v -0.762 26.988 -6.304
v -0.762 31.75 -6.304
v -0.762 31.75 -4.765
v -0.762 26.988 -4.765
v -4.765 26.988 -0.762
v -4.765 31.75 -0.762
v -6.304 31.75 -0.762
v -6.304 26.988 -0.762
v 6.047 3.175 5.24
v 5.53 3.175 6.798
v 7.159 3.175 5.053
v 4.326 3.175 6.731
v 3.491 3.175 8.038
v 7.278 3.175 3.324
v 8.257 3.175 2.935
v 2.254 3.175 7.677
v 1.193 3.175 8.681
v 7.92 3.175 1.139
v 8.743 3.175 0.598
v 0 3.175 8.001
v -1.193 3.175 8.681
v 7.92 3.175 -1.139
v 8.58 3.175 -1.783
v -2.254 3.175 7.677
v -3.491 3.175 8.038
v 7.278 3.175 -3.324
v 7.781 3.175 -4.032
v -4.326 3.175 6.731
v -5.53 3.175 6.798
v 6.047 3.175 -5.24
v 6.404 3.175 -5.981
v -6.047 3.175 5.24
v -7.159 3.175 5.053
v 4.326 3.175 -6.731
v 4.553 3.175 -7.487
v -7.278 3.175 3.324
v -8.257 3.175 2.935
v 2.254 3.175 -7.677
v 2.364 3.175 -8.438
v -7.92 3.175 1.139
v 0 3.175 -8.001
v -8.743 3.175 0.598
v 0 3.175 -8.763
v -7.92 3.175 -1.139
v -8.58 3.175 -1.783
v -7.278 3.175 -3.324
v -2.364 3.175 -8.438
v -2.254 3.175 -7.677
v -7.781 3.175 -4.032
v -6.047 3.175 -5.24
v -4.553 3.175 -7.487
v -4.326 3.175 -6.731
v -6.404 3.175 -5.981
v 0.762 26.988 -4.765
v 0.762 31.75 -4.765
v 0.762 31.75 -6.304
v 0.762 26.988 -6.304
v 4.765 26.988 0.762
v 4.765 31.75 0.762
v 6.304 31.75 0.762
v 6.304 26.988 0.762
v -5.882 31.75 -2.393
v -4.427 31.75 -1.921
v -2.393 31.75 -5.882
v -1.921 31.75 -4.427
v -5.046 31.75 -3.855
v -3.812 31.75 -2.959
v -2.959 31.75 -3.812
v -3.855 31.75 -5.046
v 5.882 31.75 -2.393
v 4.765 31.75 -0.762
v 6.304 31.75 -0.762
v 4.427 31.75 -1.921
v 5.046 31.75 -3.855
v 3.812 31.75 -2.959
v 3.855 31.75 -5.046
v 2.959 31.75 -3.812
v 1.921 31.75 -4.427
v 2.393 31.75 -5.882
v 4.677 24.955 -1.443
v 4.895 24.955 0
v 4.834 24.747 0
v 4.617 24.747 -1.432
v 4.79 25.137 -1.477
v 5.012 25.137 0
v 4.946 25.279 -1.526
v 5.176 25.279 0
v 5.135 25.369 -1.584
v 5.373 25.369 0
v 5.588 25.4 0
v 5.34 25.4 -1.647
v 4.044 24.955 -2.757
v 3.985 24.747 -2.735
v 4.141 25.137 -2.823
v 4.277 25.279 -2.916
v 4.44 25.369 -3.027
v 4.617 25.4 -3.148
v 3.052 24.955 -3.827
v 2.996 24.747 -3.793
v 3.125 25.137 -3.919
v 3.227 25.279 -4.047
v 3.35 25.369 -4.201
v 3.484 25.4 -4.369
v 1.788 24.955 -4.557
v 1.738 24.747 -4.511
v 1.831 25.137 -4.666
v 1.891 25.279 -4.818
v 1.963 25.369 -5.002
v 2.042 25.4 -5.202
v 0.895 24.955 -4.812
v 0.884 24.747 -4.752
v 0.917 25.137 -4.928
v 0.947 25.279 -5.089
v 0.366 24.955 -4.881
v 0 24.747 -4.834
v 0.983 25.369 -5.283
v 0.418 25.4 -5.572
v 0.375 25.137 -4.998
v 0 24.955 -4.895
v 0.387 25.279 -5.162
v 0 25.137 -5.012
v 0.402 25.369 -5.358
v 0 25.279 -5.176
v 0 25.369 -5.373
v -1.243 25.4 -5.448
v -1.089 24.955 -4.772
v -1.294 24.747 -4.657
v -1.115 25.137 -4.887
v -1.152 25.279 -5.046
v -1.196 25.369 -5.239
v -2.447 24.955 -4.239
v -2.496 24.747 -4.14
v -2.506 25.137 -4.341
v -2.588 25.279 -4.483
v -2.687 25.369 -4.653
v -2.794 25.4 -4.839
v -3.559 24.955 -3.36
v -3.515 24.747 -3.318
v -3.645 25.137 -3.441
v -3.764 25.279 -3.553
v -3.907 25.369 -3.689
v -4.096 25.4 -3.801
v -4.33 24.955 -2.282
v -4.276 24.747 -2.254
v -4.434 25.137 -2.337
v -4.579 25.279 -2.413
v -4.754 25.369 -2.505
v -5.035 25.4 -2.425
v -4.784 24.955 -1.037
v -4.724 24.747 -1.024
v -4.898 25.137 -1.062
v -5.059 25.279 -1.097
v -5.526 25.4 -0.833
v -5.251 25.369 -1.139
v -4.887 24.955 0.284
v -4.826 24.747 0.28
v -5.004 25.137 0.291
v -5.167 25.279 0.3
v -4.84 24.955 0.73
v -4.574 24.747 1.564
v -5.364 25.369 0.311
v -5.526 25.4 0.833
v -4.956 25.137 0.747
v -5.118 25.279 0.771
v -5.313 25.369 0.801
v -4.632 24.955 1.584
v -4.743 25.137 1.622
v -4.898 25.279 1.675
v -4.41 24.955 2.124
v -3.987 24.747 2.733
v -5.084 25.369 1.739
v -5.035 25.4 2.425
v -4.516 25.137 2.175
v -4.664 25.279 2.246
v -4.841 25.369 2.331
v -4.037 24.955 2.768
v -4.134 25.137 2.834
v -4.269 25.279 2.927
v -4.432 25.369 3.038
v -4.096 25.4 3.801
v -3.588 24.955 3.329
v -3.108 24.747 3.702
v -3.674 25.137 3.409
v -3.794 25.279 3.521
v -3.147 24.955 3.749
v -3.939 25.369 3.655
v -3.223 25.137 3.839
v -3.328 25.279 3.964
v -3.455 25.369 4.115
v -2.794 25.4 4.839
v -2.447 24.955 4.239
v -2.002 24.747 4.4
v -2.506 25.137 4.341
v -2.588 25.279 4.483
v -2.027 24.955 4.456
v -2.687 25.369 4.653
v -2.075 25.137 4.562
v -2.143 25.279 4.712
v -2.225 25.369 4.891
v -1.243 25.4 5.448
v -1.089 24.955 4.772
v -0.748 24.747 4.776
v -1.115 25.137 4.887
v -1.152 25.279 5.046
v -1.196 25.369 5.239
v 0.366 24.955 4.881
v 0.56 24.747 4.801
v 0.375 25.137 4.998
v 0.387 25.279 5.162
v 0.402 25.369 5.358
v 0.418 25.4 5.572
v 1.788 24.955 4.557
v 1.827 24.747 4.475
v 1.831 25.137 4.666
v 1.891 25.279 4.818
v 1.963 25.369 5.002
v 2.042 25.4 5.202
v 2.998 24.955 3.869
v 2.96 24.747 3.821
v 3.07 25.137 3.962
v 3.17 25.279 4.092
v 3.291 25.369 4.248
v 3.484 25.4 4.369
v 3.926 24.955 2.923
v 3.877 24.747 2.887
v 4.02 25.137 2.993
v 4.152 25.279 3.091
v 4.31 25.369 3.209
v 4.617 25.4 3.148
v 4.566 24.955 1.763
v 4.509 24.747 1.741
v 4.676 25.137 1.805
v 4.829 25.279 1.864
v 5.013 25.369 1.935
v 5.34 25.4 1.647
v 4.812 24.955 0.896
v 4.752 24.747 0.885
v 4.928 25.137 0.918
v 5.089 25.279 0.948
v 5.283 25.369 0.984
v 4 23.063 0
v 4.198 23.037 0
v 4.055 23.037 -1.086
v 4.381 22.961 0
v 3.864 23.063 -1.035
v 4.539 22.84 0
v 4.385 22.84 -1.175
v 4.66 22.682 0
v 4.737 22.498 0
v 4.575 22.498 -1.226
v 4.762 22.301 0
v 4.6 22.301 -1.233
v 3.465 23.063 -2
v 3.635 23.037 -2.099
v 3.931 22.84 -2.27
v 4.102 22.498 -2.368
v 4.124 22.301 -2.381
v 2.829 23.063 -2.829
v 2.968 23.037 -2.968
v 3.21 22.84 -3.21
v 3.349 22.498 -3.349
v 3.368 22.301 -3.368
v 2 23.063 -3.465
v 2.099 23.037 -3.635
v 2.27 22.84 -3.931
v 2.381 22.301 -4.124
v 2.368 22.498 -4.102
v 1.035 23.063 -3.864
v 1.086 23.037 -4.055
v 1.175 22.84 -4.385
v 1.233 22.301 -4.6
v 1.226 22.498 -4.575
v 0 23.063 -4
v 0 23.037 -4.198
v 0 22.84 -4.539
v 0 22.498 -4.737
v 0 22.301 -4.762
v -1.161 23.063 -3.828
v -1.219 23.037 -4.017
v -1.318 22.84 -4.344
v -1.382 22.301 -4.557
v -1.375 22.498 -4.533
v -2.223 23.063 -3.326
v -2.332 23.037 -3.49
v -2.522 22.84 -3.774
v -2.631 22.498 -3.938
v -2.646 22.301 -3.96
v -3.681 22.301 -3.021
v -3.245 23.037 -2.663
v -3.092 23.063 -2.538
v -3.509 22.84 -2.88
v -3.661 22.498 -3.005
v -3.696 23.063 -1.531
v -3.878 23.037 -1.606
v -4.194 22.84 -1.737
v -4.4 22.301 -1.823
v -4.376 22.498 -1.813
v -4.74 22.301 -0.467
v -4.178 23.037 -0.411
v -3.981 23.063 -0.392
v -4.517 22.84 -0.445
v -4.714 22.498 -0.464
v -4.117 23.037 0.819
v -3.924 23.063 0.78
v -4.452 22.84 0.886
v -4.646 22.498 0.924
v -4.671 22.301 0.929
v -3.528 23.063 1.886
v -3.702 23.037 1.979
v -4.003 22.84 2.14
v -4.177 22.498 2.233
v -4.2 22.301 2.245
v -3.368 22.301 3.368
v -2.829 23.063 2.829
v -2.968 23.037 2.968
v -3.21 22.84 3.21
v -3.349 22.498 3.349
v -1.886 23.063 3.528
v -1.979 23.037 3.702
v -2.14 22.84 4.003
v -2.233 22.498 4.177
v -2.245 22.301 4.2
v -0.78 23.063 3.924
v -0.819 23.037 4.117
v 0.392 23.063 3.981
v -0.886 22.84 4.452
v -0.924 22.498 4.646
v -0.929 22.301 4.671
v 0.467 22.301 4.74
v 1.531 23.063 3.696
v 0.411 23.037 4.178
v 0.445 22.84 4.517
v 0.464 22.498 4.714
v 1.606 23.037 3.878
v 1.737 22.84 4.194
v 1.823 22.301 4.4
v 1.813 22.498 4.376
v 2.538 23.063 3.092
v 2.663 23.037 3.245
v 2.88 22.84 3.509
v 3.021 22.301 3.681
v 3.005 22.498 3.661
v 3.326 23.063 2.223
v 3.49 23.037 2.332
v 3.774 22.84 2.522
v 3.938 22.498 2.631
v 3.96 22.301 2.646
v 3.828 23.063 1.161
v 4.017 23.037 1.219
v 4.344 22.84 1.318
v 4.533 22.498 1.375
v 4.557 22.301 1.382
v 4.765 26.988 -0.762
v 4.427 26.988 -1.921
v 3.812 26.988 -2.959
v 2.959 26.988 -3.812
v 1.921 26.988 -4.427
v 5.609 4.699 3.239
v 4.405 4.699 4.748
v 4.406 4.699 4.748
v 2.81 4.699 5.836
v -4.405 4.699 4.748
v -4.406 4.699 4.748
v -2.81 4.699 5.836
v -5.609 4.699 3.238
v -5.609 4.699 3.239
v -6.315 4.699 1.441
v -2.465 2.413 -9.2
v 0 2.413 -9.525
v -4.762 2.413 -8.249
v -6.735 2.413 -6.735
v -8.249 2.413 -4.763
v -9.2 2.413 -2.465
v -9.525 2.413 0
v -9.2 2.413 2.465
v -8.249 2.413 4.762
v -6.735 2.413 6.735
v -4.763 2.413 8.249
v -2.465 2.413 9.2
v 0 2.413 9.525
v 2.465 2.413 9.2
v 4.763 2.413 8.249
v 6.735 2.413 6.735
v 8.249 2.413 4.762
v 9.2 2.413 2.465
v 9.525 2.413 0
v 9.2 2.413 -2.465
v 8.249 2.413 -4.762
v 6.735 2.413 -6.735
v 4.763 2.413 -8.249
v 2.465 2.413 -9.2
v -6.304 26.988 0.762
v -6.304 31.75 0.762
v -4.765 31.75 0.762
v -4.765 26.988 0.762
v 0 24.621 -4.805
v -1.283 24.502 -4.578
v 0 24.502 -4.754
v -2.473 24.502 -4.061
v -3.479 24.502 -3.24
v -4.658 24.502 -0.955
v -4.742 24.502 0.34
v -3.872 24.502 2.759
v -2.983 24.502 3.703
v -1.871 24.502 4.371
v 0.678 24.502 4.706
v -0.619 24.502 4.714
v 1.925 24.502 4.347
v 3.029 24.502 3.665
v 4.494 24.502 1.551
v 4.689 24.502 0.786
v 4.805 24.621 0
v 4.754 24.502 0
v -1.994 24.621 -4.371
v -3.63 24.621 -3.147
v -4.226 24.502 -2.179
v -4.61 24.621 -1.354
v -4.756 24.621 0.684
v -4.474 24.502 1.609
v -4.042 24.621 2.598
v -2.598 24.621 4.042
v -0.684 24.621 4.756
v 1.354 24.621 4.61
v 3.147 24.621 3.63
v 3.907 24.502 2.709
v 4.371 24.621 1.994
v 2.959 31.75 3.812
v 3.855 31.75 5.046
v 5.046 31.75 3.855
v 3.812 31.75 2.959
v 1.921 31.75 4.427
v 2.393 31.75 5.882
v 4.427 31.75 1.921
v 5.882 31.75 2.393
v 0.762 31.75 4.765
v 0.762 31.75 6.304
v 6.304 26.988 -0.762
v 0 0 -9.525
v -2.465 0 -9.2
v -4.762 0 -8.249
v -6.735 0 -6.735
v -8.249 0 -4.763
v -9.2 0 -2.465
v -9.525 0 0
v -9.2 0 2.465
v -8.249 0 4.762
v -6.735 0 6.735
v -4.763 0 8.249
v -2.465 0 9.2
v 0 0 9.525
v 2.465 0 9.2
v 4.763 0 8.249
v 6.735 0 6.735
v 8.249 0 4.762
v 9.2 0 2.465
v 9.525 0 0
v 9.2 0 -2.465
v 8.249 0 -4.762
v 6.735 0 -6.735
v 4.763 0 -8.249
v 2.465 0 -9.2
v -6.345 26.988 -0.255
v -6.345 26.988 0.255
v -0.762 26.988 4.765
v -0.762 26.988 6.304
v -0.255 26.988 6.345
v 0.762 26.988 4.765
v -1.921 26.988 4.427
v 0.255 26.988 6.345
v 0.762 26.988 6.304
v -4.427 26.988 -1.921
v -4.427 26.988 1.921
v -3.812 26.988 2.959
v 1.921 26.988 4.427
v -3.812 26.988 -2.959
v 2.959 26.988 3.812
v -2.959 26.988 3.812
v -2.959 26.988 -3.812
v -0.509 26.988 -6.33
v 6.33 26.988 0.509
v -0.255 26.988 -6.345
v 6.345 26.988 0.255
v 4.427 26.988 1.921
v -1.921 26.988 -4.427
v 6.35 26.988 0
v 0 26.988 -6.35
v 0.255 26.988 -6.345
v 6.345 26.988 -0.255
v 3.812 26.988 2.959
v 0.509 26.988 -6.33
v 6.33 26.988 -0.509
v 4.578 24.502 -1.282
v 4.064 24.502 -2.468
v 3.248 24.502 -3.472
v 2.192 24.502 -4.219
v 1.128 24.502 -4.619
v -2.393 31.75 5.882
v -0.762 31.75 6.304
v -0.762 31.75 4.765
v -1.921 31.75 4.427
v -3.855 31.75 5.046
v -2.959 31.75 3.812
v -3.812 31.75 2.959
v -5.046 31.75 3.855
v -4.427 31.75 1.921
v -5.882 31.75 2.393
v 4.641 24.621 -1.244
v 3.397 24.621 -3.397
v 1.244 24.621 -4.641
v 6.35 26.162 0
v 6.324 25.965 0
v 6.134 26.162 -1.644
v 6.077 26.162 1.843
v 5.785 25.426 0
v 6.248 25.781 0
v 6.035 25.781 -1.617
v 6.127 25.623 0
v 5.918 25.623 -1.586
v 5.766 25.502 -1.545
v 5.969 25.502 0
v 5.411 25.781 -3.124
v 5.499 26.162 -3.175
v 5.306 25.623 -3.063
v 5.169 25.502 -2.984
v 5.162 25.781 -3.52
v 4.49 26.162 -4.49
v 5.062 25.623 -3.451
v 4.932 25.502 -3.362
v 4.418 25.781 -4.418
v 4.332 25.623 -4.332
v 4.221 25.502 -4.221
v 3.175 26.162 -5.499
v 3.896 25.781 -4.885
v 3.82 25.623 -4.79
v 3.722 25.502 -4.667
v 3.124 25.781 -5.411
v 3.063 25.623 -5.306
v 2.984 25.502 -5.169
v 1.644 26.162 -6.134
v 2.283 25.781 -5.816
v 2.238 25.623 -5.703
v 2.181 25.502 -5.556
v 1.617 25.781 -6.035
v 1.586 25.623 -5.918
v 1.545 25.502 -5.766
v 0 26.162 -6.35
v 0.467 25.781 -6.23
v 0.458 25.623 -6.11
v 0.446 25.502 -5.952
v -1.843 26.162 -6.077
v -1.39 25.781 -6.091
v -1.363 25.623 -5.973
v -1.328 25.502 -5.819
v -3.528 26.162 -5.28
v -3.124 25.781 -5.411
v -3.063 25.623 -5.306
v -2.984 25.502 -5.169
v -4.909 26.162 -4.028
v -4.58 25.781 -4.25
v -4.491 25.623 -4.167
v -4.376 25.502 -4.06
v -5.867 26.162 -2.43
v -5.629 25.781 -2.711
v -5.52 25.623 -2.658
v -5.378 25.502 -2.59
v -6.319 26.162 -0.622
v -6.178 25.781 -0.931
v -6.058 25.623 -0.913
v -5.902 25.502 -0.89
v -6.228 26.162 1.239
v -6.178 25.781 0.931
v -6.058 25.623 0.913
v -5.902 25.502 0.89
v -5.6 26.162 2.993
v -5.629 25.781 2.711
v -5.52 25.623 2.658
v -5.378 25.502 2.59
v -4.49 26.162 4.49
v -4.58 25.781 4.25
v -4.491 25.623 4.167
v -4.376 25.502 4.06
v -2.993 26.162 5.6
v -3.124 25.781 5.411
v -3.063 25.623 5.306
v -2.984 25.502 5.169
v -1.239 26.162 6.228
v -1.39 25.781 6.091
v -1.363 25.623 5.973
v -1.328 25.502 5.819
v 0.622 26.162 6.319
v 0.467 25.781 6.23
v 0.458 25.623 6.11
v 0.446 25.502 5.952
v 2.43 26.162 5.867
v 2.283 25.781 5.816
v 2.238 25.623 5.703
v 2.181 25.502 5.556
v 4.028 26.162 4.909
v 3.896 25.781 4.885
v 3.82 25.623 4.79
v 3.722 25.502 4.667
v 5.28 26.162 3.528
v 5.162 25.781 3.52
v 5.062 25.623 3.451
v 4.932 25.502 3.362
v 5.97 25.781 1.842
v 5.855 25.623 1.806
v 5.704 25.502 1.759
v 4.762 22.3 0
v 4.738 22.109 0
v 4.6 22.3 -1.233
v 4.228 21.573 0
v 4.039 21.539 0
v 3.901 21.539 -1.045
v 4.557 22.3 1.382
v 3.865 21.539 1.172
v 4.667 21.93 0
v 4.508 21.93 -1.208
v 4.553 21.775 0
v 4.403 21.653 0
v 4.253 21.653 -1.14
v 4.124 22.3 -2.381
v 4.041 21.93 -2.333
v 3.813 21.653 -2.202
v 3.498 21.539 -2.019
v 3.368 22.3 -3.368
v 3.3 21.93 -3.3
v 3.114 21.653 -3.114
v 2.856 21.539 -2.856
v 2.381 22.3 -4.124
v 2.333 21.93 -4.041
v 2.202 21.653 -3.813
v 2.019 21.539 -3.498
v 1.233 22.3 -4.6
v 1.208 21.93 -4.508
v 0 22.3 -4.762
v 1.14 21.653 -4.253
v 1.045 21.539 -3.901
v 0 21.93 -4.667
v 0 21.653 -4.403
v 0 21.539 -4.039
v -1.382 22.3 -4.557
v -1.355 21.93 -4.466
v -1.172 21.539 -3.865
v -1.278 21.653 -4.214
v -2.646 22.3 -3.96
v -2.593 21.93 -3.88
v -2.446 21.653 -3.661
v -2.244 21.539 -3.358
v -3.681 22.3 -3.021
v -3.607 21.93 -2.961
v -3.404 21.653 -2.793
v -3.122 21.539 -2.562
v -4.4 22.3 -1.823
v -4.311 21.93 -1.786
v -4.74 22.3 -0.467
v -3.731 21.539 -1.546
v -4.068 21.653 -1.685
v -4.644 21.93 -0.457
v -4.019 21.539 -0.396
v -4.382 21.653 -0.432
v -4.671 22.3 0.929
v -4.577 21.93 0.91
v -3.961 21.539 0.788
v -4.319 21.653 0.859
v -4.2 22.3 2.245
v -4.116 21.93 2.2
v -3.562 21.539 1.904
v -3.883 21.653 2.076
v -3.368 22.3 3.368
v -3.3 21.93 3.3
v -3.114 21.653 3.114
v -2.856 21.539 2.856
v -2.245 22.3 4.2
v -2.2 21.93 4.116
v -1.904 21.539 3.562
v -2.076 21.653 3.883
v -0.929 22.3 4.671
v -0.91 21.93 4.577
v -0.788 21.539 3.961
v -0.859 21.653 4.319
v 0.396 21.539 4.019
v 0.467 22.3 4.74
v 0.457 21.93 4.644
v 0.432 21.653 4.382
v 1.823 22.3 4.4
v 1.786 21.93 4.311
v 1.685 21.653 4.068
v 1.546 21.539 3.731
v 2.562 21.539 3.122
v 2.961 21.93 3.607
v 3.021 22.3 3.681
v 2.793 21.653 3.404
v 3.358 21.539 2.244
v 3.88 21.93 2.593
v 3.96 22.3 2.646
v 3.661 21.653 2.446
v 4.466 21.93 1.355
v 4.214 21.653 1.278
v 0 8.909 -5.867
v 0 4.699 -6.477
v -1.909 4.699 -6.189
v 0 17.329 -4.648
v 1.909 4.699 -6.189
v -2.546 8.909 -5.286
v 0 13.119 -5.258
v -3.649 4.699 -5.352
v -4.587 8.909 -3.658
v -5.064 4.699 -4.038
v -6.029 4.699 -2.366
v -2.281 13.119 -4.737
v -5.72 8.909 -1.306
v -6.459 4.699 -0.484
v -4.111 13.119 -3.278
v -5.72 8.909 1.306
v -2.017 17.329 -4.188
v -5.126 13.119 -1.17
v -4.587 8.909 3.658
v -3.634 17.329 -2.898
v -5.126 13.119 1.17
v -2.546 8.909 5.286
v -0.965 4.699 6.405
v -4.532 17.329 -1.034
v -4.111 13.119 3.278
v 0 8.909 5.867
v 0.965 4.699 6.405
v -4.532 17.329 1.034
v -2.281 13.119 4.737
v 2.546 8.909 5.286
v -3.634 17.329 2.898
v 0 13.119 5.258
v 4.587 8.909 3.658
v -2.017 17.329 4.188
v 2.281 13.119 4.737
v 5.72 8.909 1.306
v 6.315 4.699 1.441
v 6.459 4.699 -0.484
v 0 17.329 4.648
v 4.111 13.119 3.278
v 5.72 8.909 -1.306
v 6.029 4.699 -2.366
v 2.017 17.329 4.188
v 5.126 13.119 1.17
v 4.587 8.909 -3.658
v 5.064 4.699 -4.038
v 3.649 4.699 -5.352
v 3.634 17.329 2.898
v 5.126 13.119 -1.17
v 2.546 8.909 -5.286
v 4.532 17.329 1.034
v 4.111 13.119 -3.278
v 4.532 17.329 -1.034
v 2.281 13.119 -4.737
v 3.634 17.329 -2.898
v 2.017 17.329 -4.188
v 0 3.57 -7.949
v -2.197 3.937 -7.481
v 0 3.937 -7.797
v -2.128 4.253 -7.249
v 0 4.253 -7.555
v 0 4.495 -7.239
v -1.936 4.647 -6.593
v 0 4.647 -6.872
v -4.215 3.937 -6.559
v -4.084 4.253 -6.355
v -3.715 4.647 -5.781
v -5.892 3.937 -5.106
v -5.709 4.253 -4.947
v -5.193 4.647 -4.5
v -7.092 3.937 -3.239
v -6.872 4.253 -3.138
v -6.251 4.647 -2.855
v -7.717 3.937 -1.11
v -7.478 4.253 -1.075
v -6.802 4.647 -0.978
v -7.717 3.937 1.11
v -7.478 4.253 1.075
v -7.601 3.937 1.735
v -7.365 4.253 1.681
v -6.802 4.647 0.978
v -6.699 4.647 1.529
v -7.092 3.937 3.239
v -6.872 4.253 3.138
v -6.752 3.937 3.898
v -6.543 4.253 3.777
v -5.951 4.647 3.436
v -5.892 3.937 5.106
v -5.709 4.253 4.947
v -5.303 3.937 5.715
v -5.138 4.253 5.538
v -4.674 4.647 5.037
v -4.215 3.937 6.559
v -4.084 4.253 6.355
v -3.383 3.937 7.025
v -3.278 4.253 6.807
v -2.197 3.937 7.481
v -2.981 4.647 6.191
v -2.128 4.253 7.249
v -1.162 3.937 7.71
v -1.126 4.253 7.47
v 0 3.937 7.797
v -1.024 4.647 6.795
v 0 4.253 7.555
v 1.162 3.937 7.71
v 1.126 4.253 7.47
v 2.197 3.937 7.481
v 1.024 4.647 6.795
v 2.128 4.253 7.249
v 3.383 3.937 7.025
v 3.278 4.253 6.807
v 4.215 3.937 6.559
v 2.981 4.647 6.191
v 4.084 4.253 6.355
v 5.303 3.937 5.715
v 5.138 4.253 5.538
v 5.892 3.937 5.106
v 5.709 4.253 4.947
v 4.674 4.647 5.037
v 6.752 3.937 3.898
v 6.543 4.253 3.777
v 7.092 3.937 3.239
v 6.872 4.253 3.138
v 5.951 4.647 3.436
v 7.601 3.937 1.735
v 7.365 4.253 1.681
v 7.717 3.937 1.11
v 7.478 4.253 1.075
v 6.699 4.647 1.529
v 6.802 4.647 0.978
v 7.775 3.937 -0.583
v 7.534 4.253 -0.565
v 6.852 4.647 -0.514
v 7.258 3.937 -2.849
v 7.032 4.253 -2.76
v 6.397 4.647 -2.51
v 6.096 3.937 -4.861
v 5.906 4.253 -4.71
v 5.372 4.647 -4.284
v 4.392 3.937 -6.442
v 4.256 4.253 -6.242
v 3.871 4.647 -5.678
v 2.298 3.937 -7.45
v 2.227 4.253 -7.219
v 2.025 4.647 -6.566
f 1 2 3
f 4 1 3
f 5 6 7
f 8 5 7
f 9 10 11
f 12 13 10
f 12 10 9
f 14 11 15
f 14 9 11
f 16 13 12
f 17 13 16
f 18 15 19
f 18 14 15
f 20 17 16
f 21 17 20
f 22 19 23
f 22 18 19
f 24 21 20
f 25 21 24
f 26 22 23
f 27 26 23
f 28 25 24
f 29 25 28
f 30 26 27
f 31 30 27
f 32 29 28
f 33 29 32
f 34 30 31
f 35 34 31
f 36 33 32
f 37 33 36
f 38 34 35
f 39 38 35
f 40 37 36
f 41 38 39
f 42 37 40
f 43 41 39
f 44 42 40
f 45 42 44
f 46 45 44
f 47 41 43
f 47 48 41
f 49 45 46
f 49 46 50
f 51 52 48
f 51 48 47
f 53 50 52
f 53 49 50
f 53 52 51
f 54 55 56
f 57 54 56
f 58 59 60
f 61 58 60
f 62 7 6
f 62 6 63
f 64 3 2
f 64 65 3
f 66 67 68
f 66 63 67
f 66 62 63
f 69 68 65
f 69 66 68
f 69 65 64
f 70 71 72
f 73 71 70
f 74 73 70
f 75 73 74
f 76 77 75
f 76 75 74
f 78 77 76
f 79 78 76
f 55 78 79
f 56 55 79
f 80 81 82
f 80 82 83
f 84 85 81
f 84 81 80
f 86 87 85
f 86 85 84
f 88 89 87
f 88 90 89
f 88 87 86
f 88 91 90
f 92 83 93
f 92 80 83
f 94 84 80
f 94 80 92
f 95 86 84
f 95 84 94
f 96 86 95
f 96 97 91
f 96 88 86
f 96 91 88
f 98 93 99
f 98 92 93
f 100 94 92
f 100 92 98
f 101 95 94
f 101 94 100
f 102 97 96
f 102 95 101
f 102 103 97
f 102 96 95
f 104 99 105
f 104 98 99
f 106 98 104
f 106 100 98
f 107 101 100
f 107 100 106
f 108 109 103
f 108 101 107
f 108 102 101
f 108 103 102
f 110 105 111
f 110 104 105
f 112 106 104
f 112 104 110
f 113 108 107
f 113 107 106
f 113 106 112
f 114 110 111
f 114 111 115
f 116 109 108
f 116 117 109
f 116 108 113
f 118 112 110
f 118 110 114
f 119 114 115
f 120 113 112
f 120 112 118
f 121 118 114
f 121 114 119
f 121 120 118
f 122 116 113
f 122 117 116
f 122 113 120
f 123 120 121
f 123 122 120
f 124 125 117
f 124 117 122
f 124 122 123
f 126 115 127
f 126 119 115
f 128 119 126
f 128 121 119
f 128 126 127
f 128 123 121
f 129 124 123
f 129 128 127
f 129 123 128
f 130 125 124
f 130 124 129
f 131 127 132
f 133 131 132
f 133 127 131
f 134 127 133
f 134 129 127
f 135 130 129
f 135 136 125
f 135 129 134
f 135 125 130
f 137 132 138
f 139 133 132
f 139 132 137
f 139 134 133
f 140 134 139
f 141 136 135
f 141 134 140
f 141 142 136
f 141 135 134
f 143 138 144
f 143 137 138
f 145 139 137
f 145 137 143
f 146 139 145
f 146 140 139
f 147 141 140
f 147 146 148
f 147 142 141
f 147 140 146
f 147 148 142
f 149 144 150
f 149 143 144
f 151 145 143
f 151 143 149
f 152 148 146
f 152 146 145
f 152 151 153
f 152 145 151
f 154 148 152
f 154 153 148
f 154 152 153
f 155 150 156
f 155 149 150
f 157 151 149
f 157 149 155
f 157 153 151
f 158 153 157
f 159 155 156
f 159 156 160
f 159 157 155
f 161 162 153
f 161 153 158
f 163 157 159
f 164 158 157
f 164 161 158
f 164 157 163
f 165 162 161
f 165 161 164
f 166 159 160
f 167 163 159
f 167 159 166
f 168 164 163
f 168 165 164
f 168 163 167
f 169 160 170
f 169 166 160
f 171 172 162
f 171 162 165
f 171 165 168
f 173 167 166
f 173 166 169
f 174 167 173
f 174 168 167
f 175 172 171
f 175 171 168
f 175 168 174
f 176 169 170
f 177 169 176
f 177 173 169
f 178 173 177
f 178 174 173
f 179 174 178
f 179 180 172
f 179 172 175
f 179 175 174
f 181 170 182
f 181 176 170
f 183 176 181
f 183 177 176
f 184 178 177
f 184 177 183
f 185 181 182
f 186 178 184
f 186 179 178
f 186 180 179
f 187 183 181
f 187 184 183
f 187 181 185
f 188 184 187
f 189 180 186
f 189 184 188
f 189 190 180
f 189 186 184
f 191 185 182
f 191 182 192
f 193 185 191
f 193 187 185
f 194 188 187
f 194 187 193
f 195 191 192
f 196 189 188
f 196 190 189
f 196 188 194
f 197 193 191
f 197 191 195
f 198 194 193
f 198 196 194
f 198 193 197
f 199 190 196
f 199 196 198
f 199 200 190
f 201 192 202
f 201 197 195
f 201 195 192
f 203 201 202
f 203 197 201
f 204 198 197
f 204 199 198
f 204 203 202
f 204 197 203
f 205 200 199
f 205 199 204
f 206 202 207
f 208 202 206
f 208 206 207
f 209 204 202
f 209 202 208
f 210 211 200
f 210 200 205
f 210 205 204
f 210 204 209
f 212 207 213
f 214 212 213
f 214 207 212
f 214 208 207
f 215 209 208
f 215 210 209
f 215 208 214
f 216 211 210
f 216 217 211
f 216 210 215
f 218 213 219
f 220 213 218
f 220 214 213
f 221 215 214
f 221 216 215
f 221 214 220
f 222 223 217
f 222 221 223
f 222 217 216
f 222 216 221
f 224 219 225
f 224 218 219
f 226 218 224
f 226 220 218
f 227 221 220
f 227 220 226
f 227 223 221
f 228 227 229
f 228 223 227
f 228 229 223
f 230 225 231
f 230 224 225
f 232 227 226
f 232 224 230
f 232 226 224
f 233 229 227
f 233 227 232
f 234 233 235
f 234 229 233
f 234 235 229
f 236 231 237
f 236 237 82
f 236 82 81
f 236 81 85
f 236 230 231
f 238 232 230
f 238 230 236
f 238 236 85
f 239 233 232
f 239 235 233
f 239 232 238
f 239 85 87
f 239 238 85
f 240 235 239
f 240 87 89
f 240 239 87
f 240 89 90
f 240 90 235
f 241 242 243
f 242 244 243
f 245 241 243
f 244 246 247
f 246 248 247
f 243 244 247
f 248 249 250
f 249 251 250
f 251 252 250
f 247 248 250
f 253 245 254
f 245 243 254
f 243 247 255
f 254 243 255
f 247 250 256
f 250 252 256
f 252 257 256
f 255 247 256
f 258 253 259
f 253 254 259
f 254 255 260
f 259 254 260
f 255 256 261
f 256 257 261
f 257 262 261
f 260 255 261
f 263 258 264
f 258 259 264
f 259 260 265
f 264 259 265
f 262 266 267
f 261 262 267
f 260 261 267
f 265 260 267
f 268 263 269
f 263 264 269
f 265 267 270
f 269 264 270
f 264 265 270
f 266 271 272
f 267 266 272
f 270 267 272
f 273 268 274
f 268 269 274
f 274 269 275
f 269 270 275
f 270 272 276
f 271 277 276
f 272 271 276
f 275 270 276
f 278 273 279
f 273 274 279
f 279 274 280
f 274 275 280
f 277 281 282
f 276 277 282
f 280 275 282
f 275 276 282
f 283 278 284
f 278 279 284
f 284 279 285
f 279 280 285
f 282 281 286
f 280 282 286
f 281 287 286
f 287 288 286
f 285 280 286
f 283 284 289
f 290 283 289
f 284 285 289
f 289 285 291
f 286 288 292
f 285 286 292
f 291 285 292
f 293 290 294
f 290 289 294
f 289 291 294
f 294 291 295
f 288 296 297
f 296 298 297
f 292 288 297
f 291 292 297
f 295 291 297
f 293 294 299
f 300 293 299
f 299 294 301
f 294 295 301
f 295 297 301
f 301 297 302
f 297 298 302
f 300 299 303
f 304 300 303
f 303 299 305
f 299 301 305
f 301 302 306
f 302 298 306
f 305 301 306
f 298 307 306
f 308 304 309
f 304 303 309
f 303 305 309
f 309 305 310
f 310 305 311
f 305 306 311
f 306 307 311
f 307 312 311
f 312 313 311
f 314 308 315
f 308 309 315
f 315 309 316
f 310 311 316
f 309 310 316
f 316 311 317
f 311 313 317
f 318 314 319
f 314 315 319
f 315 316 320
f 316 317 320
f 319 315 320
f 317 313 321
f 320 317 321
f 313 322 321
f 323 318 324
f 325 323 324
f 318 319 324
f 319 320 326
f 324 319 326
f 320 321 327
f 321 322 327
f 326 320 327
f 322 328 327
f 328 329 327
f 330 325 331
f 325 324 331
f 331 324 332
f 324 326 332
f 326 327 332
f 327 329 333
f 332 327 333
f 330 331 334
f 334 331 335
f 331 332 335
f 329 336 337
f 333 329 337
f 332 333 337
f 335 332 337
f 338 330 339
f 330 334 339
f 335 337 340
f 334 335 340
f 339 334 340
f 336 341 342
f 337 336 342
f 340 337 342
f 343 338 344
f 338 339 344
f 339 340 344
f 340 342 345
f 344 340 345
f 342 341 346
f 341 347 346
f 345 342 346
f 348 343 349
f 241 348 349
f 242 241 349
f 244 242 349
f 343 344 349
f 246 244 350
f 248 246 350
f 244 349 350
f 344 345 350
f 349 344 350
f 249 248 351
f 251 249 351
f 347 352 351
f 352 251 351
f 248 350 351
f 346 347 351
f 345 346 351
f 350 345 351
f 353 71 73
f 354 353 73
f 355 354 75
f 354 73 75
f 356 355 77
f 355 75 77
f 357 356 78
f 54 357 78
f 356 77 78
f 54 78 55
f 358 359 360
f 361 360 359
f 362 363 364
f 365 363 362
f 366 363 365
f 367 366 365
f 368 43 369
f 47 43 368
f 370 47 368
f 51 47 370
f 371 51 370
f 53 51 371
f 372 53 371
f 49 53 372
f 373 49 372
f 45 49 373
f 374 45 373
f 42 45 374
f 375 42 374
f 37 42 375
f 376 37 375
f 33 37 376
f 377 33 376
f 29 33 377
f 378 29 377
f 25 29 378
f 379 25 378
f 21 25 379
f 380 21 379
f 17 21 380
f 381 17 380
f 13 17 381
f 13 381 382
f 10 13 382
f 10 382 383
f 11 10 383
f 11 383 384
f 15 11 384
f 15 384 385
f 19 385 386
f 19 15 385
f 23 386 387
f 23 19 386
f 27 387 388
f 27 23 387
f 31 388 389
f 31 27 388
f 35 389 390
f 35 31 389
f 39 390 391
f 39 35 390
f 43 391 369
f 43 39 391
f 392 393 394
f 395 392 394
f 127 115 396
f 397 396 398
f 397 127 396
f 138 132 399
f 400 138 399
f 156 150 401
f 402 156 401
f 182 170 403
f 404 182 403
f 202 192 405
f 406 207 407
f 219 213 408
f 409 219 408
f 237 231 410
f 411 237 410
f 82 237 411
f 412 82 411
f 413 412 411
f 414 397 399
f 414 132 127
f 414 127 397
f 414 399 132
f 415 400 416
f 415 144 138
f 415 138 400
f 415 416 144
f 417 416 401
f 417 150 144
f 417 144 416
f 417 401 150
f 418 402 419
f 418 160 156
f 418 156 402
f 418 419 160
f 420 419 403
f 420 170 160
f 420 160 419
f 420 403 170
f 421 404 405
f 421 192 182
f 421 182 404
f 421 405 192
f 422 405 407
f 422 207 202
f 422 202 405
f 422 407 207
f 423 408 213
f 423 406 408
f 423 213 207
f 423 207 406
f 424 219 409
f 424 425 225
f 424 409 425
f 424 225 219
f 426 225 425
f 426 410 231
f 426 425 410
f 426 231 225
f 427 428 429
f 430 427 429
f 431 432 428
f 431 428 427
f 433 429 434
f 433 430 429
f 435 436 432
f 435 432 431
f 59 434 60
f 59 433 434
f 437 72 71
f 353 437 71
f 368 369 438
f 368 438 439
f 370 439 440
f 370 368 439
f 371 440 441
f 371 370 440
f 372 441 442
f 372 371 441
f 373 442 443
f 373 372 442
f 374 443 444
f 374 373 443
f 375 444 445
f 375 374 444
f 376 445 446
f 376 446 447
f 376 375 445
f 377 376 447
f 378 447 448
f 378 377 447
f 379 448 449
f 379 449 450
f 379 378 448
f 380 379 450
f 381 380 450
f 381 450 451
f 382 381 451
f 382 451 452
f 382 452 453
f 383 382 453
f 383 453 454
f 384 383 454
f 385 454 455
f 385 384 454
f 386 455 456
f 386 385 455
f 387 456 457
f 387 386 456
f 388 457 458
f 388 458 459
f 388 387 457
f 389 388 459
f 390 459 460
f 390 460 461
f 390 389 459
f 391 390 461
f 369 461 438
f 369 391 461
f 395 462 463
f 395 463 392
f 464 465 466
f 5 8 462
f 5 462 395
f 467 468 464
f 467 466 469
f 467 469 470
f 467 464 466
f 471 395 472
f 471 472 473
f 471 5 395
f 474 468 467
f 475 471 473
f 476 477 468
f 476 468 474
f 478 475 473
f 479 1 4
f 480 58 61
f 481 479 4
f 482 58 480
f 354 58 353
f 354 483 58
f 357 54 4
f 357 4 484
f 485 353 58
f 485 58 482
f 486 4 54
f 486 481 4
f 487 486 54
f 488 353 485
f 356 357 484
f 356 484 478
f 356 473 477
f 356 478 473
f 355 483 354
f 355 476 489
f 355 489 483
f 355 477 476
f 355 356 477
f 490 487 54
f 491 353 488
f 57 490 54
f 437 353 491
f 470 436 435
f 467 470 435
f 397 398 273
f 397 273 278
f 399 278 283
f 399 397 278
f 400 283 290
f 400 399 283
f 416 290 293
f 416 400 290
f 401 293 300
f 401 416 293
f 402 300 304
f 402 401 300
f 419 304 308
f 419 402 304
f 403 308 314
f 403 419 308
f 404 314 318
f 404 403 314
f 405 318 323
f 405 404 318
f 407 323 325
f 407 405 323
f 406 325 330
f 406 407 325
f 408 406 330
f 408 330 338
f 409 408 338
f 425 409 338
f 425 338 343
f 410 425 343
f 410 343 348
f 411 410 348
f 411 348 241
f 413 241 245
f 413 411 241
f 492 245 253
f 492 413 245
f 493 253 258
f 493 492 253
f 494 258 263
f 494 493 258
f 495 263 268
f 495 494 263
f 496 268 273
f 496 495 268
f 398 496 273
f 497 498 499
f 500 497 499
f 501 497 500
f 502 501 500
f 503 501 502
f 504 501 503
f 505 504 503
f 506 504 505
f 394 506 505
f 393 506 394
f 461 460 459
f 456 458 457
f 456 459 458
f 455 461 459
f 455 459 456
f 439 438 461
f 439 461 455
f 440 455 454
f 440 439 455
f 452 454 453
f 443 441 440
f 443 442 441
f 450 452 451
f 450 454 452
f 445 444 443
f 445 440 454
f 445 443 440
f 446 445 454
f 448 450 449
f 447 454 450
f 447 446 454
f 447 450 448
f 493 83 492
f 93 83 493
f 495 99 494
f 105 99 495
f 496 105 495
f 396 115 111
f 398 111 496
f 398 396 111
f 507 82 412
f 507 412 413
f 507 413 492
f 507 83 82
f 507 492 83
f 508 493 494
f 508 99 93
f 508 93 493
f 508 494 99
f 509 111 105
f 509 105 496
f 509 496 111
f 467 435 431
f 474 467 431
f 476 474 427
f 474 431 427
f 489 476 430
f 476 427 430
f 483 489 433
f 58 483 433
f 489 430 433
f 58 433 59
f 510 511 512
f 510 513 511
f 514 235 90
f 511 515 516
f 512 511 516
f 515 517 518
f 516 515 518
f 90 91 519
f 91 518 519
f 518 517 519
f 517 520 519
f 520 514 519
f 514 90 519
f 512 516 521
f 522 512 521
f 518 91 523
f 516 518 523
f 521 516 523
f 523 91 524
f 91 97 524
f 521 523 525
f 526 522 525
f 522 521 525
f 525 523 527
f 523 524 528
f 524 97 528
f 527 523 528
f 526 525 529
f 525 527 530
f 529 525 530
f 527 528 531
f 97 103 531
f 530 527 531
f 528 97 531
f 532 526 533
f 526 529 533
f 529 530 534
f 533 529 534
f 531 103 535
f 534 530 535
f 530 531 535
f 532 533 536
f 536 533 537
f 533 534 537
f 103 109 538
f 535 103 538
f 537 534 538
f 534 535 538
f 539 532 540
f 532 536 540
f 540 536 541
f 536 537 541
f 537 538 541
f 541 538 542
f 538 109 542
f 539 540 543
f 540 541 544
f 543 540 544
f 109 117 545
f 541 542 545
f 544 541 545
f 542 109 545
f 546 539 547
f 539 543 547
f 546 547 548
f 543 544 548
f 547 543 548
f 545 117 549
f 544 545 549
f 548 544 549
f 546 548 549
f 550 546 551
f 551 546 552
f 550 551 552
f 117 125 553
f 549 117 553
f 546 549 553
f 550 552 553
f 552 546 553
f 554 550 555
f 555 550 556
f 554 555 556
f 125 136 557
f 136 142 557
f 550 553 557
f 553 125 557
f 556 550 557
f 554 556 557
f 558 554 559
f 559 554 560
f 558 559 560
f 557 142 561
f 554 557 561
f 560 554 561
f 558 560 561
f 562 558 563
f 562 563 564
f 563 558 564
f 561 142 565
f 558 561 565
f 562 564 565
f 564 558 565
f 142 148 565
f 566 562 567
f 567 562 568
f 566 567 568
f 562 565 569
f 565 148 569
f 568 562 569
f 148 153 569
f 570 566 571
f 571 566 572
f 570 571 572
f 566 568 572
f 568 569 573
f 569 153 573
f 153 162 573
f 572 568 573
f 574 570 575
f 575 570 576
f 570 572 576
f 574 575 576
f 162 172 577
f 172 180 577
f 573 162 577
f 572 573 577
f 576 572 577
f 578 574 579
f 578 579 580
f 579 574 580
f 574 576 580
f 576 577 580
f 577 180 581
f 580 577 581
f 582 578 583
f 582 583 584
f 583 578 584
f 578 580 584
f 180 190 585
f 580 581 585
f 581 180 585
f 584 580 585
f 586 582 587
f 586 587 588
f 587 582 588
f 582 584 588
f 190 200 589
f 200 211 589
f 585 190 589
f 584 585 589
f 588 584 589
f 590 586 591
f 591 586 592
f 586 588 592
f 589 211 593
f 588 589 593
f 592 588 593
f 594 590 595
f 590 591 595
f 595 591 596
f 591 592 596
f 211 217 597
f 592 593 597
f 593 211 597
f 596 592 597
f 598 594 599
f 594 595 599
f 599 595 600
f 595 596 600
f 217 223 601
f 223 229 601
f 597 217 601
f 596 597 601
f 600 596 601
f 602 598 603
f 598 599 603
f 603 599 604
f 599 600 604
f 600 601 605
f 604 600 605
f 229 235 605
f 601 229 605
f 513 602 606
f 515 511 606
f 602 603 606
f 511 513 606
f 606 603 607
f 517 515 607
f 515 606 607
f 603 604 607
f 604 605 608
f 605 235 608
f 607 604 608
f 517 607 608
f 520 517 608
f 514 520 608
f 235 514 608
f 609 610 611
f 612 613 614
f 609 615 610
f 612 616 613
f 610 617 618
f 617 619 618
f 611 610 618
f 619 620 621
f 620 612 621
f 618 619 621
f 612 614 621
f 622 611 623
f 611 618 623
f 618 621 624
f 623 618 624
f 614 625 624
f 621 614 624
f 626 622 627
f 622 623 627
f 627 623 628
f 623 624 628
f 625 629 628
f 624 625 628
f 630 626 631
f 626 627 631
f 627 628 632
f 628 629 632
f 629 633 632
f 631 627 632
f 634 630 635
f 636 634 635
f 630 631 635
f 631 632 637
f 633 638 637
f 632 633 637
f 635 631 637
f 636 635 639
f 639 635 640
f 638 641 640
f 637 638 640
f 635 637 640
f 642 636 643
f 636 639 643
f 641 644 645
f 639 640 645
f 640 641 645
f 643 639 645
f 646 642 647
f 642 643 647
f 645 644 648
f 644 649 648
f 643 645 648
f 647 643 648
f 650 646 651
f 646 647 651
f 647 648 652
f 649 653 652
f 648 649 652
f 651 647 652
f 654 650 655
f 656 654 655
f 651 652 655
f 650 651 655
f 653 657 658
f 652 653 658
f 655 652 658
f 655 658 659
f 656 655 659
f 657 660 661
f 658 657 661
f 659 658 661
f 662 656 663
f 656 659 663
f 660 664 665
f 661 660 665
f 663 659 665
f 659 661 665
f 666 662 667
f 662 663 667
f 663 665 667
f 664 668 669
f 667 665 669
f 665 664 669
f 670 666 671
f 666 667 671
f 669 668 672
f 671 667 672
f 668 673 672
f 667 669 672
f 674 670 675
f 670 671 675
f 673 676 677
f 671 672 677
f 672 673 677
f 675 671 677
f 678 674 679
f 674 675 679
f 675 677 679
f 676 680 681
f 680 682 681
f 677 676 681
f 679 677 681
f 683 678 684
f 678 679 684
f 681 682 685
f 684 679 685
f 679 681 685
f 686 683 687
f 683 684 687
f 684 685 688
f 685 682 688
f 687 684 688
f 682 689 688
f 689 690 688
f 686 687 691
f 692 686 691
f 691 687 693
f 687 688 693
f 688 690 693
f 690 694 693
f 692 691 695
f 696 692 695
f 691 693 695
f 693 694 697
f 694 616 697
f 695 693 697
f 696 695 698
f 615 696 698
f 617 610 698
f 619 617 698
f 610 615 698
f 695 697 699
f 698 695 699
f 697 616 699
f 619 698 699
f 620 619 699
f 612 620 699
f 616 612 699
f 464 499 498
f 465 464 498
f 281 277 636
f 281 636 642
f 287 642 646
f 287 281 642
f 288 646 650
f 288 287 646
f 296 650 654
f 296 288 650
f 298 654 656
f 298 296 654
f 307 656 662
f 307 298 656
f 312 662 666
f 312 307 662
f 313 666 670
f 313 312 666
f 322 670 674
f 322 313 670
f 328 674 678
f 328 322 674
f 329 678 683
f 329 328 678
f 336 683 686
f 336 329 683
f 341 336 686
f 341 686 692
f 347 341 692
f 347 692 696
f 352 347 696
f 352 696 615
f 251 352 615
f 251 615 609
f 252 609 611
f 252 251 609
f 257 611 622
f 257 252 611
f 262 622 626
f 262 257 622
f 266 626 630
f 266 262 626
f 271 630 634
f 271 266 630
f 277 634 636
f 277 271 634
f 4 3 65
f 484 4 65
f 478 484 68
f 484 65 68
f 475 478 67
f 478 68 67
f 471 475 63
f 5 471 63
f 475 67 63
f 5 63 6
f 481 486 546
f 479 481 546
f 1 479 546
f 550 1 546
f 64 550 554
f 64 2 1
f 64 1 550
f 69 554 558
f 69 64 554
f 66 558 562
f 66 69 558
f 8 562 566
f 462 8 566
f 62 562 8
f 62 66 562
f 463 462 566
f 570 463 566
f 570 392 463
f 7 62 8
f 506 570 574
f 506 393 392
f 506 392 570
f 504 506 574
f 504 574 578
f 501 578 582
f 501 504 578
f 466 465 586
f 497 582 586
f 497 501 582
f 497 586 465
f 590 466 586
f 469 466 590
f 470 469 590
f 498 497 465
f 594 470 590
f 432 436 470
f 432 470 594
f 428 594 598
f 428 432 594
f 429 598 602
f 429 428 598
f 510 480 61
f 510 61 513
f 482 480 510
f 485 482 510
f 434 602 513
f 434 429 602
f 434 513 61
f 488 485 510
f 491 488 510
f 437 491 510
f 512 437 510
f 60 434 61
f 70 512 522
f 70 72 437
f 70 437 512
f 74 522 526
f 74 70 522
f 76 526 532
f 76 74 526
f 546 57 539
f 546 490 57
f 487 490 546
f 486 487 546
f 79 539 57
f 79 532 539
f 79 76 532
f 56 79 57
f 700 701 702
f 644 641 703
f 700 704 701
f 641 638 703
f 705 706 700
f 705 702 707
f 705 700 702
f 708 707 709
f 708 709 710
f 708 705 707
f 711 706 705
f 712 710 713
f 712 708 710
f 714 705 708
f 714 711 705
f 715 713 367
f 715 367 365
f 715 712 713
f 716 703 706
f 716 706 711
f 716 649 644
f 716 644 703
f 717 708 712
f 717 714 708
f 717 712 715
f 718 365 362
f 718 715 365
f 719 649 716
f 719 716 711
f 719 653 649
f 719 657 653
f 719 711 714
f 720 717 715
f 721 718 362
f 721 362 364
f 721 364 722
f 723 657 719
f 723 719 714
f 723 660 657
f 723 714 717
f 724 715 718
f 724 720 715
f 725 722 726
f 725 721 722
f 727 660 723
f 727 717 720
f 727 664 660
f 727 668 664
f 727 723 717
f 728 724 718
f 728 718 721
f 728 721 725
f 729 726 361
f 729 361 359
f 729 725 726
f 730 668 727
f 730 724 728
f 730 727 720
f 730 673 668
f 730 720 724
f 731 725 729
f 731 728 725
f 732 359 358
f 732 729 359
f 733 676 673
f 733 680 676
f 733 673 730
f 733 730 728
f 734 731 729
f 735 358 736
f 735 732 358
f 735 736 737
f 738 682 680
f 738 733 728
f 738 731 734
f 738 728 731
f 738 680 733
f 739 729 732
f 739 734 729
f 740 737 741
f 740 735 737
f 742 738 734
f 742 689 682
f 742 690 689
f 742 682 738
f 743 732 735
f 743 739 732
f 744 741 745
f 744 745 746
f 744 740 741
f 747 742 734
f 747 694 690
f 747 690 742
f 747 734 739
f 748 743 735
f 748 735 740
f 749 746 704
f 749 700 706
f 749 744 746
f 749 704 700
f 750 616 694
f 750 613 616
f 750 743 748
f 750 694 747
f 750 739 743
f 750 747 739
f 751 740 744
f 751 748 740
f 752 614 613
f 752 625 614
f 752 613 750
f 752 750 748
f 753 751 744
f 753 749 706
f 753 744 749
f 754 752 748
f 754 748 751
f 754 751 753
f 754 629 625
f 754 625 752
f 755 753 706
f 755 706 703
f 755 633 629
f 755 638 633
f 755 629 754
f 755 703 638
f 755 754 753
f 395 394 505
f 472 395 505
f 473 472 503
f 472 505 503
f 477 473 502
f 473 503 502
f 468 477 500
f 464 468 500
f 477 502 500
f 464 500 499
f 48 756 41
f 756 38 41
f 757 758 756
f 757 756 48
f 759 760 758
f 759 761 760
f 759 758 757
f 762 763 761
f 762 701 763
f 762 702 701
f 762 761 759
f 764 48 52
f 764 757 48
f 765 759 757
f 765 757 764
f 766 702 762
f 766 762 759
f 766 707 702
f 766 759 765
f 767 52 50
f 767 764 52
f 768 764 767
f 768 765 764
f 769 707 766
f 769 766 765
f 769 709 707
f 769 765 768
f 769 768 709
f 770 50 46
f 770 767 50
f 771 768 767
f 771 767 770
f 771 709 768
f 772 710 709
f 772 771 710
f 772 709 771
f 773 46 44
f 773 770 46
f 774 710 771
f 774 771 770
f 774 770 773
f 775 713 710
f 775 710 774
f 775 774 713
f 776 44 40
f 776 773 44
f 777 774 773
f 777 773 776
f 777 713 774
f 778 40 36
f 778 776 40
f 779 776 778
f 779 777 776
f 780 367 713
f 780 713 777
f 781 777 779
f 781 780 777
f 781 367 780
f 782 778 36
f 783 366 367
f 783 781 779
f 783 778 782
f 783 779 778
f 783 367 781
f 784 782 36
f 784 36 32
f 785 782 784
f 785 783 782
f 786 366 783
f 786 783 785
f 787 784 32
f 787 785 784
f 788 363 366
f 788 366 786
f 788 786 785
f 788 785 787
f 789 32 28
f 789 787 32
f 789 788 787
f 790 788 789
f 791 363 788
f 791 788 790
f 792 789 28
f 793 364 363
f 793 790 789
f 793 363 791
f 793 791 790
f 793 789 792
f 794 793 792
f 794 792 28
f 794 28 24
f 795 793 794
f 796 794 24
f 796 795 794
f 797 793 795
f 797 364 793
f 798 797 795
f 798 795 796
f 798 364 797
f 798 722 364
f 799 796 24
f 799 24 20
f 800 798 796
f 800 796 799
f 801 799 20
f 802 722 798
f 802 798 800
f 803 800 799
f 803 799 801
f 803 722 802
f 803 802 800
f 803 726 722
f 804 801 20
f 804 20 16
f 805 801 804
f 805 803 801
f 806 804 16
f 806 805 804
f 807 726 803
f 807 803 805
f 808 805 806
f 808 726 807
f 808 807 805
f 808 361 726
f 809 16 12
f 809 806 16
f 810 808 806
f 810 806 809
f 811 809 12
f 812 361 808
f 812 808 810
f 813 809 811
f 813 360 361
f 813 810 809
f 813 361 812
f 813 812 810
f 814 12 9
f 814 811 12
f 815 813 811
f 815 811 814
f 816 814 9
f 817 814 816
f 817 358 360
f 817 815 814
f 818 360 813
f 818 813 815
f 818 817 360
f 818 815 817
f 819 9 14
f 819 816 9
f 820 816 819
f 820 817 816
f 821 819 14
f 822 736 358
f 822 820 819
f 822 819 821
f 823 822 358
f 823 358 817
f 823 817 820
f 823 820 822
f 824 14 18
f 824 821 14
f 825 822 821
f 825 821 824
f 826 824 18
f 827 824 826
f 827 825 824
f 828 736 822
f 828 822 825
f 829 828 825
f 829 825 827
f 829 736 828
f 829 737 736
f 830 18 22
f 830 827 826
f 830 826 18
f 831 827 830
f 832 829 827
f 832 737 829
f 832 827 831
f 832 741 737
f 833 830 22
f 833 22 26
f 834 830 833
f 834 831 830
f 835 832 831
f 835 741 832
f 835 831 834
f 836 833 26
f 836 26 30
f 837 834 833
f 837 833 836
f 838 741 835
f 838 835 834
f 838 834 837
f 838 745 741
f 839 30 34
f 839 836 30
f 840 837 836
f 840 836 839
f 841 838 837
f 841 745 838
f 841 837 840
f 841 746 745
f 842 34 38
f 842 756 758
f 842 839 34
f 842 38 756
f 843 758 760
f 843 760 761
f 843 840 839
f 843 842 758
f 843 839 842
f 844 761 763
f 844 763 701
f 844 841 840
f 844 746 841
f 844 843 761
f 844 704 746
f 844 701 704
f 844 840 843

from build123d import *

# Parameters (mm, degrees)
CHAMFER1_SIZE      = 0.762
FILLET1_R          = 1.524
FILLET3_R          = 0.762
SKETCH3_W          = 1.524
SKETCH3_H          = 1.524
CUT_EXTRUDE1_DEPTH = 4.7625


with BuildPart() as part:
    # Sketch1 → Revolve1 (revolve)
    with BuildSketch(Plane.XY, mode=Mode.PRIVATE) as revolve1_sk:
        Polygon((0, 0), (-9.525, 0), (-9.525, 3.175), (-8.001, 3.175), (-8.001, 4.699), (-6.477, 4.699), (-4.0386, 21.5392), (-4.7625, 21.5392), (-4.7625, 23.0632), (-4.0005, 23.0632), (-4.826, 24.638), (-4.826, 25.4), (-6.35, 25.4), (-6.35, 31.75), (0, 31.75), align=None)
    revolve(revolve1_sk.sketch.rotate(Axis((0, 0, 0), (0, 1, 0)), 270), axis=Axis((0, 0, 0), (0, 1, 0)))

    # Chamfer1
    chamfer1_edges = [part.edges().sort_by_distance(p)[0] for p in [
        (0, 3.175, 9.525),
    ]]
    chamfer(chamfer1_edges, length=CHAMFER1_SIZE)

    # Fillet1
    fillet1_edges = [part.edges().sort_by_distance(p)[0] for p in [
        (0, 4.699, 8.001),
    ]]
    fillet(fillet1_edges, radius=FILLET1_R - 0.0001)  # a hair under: the kernel refuses the full size

    # Fillet2: read off the stored shape, not the designer's step
    # Fillet2 outline → Fillet2 (revolve, cut)
    with BuildSketch(Plane.XY):
        with BuildLine():
            ThreePointArc((6.35, 26.162), (6.126815367, 25.623184633), (5.588, 25.4))
            Line((5.588, 25.4), (6.35, 25.4))
            Line((6.35, 25.4), (6.35, 26.162))
        make_face()
        with BuildLine():
            Line((4.7625, 22.3012), (4.7625, 23.0632))
            Line((4.7625, 23.0632), (4.0005, 23.0632))
            ThreePointArc((4.0005, 23.0632), (4.539315367, 22.840015367), (4.7625, 22.3012))
        make_face()
        with BuildLine():
            Line((4.7625, 21.5392), (4.7625, 22.300246904))
            ThreePointArc((4.7625, 22.300246904), (4.552621454, 21.775074646), (4.0386, 21.5392))
            Line((4.0386, 21.5392), (4.7625, 21.5392))
        make_face()
    revolve(axis=Axis((0, 0, 0), (0, 1, 0)), mode=Mode.SUBTRACT)

    # Fillet2 2 outline → Fillet2 2 (revolve)
    with BuildSketch(Plane.XY):
        with BuildLine():
            ThreePointArc((4.826, 24.638), (5.049184633, 25.176815367), (5.588, 25.4))
            Line((5.588, 25.4), (4.826, 25.4))
            Line((4.826, 25.4), (4.826, 24.638))
        make_face()
    revolve(axis=Axis((0, 0, 0), (0, 1, 0)))

    # Fillet3
    fillet3_edges = [part.edges().sort_by_distance(p)[0] for p in [
        (-3.412497326, 24.638, 3.412497326),
    ]]
    fillet(fillet3_edges, radius=FILLET3_R)

    # Sketch3 → Cut-Extrude1 (cut)
    with BuildSketch(Plane(origin=(0, 31.75, 0), x_dir=(1, 0, 0), z_dir=(0, 1, 0))):
        with BuildLine():
            ThreePointArc((-0.762, 4.765462412), (-3.412497326, 3.412497326), (-4.765462412, 0.762))
            Line((-4.765462412, 0.762), (-0.762, 0.762))
            Line((-0.762, 0.762), (-0.762, 4.765462412))
        make_face()
        with BuildLine():
            ThreePointArc((-4.765462412, 0.762), (-4.826, 0), (-4.765462412, -0.762))
            Line((-4.765462412, -0.762), (-0.762, -0.762))
            Line((-0.762, -0.762), (-0.762, 0.762))
            Line((-0.762, 0.762), (-4.765462412, 0.762))
        make_face()
        with BuildLine():
            Line((-0.762, -0.762), (-4.765462412, -0.762))
            ThreePointArc((-4.765462412, -0.762), (-3.412497326, -3.412497326), (-0.762, -4.765462412))
            Line((-0.762, -4.765462412), (-0.762, -0.762))
        make_face()
        with BuildLine():
            Line((4.765462412, -0.762), (0.762, -0.762))
            Line((0.762, -0.762), (0.762, -4.765462412))
            ThreePointArc((0.762, -4.765462412), (3.412497326, -3.412497326), (4.765462412, -0.762))
        make_face()
        with BuildLine():
            Line((0.762, -0.762), (-0.762, -0.762))
            Line((-0.762, -0.762), (-0.762, -4.765462412))
            ThreePointArc((-0.762, -4.765462412), (0, -4.826), (0.762, -4.765462412))
            Line((0.762, -4.765462412), (0.762, -0.762))
        make_face()
        Rectangle(SKETCH3_W, SKETCH3_H)
        with BuildLine():
            Line((-0.762, 4.765462412), (-0.762, 0.762))
            Line((-0.762, 0.762), (0.762, 0.762))
            Line((0.762, 0.762), (0.762, 4.765462412))
            ThreePointArc((0.762, 4.765462412), (0, 4.826), (-0.762, 4.765462412))
        make_face()
        with BuildLine():
            Line((0.762, 4.765462412), (0.762, 0.762))
            Line((0.762, 0.762), (4.765462412, 0.762))
            ThreePointArc((4.765462412, 0.762), (3.412497326, 3.412497326), (0.762, 4.765462412))
        make_face()
        with BuildLine():
            Line((0.762, 0.762), (0.762, -0.762))
            Line((0.762, -0.762), (4.765462412, -0.762))
            ThreePointArc((4.765462412, -0.762), (4.810841797, -0.382200471), (4.826, 0))
            ThreePointArc((4.826, 0), (4.810841797, 0.382200471), (4.765462412, 0.762))
            Line((4.765462412, 0.762), (0.762, 0.762))
        make_face()
        with BuildLine():
            Line((-0.762, -4.765462412), (-0.762, -6.304114212))
            ThreePointArc((-0.762, -6.304114212), (0, -6.35), (0.762, -6.304114212))
            Line((0.762, -6.304114212), (0.762, -4.765462412))
            ThreePointArc((0.762, -4.765462412), (0, -4.826), (-0.762, -4.765462412))
        make_face()
        with BuildLine():
            ThreePointArc((0.762, 6.304114212), (0, 6.35), (-0.762, 6.304114212))
            Line((-0.762, 6.304114212), (-0.762, 4.765462412))
            ThreePointArc((-0.762, 4.765462412), (0, 4.826), (0.762, 4.765462412))
            Line((0.762, 4.765462412), (0.762, 6.304114212))
        make_face()
        with BuildLine():
            ThreePointArc((-6.304114212, 0.762), (-6.35, 0), (-6.304114212, -0.762))
            Line((-6.304114212, -0.762), (-4.765462412, -0.762))
            ThreePointArc((-4.765462412, -0.762), (-4.826, 0), (-4.765462412, 0.762))
            Line((-4.765462412, 0.762), (-6.304114212, 0.762))
        make_face()
        with BuildLine():
            Line((4.765462412, -0.762), (6.304114212, -0.762))
            ThreePointArc((6.304114212, -0.762), (6.338518173, -0.381690158), (6.35, 0))
            ThreePointArc((6.35, 0), (6.338518173, 0.381690158), (6.304114212, 0.762))
            Line((6.304114212, 0.762), (4.765462412, 0.762))
            ThreePointArc((4.765462412, 0.762), (4.810841797, 0.382200471), (4.826, 0))
            ThreePointArc((4.826, 0), (4.810841797, -0.382200471), (4.765462412, -0.762))
        make_face()
    extrude(amount=-CUT_EXTRUDE1_DEPTH, mode=Mode.SUBTRACT)


solid = part.part
